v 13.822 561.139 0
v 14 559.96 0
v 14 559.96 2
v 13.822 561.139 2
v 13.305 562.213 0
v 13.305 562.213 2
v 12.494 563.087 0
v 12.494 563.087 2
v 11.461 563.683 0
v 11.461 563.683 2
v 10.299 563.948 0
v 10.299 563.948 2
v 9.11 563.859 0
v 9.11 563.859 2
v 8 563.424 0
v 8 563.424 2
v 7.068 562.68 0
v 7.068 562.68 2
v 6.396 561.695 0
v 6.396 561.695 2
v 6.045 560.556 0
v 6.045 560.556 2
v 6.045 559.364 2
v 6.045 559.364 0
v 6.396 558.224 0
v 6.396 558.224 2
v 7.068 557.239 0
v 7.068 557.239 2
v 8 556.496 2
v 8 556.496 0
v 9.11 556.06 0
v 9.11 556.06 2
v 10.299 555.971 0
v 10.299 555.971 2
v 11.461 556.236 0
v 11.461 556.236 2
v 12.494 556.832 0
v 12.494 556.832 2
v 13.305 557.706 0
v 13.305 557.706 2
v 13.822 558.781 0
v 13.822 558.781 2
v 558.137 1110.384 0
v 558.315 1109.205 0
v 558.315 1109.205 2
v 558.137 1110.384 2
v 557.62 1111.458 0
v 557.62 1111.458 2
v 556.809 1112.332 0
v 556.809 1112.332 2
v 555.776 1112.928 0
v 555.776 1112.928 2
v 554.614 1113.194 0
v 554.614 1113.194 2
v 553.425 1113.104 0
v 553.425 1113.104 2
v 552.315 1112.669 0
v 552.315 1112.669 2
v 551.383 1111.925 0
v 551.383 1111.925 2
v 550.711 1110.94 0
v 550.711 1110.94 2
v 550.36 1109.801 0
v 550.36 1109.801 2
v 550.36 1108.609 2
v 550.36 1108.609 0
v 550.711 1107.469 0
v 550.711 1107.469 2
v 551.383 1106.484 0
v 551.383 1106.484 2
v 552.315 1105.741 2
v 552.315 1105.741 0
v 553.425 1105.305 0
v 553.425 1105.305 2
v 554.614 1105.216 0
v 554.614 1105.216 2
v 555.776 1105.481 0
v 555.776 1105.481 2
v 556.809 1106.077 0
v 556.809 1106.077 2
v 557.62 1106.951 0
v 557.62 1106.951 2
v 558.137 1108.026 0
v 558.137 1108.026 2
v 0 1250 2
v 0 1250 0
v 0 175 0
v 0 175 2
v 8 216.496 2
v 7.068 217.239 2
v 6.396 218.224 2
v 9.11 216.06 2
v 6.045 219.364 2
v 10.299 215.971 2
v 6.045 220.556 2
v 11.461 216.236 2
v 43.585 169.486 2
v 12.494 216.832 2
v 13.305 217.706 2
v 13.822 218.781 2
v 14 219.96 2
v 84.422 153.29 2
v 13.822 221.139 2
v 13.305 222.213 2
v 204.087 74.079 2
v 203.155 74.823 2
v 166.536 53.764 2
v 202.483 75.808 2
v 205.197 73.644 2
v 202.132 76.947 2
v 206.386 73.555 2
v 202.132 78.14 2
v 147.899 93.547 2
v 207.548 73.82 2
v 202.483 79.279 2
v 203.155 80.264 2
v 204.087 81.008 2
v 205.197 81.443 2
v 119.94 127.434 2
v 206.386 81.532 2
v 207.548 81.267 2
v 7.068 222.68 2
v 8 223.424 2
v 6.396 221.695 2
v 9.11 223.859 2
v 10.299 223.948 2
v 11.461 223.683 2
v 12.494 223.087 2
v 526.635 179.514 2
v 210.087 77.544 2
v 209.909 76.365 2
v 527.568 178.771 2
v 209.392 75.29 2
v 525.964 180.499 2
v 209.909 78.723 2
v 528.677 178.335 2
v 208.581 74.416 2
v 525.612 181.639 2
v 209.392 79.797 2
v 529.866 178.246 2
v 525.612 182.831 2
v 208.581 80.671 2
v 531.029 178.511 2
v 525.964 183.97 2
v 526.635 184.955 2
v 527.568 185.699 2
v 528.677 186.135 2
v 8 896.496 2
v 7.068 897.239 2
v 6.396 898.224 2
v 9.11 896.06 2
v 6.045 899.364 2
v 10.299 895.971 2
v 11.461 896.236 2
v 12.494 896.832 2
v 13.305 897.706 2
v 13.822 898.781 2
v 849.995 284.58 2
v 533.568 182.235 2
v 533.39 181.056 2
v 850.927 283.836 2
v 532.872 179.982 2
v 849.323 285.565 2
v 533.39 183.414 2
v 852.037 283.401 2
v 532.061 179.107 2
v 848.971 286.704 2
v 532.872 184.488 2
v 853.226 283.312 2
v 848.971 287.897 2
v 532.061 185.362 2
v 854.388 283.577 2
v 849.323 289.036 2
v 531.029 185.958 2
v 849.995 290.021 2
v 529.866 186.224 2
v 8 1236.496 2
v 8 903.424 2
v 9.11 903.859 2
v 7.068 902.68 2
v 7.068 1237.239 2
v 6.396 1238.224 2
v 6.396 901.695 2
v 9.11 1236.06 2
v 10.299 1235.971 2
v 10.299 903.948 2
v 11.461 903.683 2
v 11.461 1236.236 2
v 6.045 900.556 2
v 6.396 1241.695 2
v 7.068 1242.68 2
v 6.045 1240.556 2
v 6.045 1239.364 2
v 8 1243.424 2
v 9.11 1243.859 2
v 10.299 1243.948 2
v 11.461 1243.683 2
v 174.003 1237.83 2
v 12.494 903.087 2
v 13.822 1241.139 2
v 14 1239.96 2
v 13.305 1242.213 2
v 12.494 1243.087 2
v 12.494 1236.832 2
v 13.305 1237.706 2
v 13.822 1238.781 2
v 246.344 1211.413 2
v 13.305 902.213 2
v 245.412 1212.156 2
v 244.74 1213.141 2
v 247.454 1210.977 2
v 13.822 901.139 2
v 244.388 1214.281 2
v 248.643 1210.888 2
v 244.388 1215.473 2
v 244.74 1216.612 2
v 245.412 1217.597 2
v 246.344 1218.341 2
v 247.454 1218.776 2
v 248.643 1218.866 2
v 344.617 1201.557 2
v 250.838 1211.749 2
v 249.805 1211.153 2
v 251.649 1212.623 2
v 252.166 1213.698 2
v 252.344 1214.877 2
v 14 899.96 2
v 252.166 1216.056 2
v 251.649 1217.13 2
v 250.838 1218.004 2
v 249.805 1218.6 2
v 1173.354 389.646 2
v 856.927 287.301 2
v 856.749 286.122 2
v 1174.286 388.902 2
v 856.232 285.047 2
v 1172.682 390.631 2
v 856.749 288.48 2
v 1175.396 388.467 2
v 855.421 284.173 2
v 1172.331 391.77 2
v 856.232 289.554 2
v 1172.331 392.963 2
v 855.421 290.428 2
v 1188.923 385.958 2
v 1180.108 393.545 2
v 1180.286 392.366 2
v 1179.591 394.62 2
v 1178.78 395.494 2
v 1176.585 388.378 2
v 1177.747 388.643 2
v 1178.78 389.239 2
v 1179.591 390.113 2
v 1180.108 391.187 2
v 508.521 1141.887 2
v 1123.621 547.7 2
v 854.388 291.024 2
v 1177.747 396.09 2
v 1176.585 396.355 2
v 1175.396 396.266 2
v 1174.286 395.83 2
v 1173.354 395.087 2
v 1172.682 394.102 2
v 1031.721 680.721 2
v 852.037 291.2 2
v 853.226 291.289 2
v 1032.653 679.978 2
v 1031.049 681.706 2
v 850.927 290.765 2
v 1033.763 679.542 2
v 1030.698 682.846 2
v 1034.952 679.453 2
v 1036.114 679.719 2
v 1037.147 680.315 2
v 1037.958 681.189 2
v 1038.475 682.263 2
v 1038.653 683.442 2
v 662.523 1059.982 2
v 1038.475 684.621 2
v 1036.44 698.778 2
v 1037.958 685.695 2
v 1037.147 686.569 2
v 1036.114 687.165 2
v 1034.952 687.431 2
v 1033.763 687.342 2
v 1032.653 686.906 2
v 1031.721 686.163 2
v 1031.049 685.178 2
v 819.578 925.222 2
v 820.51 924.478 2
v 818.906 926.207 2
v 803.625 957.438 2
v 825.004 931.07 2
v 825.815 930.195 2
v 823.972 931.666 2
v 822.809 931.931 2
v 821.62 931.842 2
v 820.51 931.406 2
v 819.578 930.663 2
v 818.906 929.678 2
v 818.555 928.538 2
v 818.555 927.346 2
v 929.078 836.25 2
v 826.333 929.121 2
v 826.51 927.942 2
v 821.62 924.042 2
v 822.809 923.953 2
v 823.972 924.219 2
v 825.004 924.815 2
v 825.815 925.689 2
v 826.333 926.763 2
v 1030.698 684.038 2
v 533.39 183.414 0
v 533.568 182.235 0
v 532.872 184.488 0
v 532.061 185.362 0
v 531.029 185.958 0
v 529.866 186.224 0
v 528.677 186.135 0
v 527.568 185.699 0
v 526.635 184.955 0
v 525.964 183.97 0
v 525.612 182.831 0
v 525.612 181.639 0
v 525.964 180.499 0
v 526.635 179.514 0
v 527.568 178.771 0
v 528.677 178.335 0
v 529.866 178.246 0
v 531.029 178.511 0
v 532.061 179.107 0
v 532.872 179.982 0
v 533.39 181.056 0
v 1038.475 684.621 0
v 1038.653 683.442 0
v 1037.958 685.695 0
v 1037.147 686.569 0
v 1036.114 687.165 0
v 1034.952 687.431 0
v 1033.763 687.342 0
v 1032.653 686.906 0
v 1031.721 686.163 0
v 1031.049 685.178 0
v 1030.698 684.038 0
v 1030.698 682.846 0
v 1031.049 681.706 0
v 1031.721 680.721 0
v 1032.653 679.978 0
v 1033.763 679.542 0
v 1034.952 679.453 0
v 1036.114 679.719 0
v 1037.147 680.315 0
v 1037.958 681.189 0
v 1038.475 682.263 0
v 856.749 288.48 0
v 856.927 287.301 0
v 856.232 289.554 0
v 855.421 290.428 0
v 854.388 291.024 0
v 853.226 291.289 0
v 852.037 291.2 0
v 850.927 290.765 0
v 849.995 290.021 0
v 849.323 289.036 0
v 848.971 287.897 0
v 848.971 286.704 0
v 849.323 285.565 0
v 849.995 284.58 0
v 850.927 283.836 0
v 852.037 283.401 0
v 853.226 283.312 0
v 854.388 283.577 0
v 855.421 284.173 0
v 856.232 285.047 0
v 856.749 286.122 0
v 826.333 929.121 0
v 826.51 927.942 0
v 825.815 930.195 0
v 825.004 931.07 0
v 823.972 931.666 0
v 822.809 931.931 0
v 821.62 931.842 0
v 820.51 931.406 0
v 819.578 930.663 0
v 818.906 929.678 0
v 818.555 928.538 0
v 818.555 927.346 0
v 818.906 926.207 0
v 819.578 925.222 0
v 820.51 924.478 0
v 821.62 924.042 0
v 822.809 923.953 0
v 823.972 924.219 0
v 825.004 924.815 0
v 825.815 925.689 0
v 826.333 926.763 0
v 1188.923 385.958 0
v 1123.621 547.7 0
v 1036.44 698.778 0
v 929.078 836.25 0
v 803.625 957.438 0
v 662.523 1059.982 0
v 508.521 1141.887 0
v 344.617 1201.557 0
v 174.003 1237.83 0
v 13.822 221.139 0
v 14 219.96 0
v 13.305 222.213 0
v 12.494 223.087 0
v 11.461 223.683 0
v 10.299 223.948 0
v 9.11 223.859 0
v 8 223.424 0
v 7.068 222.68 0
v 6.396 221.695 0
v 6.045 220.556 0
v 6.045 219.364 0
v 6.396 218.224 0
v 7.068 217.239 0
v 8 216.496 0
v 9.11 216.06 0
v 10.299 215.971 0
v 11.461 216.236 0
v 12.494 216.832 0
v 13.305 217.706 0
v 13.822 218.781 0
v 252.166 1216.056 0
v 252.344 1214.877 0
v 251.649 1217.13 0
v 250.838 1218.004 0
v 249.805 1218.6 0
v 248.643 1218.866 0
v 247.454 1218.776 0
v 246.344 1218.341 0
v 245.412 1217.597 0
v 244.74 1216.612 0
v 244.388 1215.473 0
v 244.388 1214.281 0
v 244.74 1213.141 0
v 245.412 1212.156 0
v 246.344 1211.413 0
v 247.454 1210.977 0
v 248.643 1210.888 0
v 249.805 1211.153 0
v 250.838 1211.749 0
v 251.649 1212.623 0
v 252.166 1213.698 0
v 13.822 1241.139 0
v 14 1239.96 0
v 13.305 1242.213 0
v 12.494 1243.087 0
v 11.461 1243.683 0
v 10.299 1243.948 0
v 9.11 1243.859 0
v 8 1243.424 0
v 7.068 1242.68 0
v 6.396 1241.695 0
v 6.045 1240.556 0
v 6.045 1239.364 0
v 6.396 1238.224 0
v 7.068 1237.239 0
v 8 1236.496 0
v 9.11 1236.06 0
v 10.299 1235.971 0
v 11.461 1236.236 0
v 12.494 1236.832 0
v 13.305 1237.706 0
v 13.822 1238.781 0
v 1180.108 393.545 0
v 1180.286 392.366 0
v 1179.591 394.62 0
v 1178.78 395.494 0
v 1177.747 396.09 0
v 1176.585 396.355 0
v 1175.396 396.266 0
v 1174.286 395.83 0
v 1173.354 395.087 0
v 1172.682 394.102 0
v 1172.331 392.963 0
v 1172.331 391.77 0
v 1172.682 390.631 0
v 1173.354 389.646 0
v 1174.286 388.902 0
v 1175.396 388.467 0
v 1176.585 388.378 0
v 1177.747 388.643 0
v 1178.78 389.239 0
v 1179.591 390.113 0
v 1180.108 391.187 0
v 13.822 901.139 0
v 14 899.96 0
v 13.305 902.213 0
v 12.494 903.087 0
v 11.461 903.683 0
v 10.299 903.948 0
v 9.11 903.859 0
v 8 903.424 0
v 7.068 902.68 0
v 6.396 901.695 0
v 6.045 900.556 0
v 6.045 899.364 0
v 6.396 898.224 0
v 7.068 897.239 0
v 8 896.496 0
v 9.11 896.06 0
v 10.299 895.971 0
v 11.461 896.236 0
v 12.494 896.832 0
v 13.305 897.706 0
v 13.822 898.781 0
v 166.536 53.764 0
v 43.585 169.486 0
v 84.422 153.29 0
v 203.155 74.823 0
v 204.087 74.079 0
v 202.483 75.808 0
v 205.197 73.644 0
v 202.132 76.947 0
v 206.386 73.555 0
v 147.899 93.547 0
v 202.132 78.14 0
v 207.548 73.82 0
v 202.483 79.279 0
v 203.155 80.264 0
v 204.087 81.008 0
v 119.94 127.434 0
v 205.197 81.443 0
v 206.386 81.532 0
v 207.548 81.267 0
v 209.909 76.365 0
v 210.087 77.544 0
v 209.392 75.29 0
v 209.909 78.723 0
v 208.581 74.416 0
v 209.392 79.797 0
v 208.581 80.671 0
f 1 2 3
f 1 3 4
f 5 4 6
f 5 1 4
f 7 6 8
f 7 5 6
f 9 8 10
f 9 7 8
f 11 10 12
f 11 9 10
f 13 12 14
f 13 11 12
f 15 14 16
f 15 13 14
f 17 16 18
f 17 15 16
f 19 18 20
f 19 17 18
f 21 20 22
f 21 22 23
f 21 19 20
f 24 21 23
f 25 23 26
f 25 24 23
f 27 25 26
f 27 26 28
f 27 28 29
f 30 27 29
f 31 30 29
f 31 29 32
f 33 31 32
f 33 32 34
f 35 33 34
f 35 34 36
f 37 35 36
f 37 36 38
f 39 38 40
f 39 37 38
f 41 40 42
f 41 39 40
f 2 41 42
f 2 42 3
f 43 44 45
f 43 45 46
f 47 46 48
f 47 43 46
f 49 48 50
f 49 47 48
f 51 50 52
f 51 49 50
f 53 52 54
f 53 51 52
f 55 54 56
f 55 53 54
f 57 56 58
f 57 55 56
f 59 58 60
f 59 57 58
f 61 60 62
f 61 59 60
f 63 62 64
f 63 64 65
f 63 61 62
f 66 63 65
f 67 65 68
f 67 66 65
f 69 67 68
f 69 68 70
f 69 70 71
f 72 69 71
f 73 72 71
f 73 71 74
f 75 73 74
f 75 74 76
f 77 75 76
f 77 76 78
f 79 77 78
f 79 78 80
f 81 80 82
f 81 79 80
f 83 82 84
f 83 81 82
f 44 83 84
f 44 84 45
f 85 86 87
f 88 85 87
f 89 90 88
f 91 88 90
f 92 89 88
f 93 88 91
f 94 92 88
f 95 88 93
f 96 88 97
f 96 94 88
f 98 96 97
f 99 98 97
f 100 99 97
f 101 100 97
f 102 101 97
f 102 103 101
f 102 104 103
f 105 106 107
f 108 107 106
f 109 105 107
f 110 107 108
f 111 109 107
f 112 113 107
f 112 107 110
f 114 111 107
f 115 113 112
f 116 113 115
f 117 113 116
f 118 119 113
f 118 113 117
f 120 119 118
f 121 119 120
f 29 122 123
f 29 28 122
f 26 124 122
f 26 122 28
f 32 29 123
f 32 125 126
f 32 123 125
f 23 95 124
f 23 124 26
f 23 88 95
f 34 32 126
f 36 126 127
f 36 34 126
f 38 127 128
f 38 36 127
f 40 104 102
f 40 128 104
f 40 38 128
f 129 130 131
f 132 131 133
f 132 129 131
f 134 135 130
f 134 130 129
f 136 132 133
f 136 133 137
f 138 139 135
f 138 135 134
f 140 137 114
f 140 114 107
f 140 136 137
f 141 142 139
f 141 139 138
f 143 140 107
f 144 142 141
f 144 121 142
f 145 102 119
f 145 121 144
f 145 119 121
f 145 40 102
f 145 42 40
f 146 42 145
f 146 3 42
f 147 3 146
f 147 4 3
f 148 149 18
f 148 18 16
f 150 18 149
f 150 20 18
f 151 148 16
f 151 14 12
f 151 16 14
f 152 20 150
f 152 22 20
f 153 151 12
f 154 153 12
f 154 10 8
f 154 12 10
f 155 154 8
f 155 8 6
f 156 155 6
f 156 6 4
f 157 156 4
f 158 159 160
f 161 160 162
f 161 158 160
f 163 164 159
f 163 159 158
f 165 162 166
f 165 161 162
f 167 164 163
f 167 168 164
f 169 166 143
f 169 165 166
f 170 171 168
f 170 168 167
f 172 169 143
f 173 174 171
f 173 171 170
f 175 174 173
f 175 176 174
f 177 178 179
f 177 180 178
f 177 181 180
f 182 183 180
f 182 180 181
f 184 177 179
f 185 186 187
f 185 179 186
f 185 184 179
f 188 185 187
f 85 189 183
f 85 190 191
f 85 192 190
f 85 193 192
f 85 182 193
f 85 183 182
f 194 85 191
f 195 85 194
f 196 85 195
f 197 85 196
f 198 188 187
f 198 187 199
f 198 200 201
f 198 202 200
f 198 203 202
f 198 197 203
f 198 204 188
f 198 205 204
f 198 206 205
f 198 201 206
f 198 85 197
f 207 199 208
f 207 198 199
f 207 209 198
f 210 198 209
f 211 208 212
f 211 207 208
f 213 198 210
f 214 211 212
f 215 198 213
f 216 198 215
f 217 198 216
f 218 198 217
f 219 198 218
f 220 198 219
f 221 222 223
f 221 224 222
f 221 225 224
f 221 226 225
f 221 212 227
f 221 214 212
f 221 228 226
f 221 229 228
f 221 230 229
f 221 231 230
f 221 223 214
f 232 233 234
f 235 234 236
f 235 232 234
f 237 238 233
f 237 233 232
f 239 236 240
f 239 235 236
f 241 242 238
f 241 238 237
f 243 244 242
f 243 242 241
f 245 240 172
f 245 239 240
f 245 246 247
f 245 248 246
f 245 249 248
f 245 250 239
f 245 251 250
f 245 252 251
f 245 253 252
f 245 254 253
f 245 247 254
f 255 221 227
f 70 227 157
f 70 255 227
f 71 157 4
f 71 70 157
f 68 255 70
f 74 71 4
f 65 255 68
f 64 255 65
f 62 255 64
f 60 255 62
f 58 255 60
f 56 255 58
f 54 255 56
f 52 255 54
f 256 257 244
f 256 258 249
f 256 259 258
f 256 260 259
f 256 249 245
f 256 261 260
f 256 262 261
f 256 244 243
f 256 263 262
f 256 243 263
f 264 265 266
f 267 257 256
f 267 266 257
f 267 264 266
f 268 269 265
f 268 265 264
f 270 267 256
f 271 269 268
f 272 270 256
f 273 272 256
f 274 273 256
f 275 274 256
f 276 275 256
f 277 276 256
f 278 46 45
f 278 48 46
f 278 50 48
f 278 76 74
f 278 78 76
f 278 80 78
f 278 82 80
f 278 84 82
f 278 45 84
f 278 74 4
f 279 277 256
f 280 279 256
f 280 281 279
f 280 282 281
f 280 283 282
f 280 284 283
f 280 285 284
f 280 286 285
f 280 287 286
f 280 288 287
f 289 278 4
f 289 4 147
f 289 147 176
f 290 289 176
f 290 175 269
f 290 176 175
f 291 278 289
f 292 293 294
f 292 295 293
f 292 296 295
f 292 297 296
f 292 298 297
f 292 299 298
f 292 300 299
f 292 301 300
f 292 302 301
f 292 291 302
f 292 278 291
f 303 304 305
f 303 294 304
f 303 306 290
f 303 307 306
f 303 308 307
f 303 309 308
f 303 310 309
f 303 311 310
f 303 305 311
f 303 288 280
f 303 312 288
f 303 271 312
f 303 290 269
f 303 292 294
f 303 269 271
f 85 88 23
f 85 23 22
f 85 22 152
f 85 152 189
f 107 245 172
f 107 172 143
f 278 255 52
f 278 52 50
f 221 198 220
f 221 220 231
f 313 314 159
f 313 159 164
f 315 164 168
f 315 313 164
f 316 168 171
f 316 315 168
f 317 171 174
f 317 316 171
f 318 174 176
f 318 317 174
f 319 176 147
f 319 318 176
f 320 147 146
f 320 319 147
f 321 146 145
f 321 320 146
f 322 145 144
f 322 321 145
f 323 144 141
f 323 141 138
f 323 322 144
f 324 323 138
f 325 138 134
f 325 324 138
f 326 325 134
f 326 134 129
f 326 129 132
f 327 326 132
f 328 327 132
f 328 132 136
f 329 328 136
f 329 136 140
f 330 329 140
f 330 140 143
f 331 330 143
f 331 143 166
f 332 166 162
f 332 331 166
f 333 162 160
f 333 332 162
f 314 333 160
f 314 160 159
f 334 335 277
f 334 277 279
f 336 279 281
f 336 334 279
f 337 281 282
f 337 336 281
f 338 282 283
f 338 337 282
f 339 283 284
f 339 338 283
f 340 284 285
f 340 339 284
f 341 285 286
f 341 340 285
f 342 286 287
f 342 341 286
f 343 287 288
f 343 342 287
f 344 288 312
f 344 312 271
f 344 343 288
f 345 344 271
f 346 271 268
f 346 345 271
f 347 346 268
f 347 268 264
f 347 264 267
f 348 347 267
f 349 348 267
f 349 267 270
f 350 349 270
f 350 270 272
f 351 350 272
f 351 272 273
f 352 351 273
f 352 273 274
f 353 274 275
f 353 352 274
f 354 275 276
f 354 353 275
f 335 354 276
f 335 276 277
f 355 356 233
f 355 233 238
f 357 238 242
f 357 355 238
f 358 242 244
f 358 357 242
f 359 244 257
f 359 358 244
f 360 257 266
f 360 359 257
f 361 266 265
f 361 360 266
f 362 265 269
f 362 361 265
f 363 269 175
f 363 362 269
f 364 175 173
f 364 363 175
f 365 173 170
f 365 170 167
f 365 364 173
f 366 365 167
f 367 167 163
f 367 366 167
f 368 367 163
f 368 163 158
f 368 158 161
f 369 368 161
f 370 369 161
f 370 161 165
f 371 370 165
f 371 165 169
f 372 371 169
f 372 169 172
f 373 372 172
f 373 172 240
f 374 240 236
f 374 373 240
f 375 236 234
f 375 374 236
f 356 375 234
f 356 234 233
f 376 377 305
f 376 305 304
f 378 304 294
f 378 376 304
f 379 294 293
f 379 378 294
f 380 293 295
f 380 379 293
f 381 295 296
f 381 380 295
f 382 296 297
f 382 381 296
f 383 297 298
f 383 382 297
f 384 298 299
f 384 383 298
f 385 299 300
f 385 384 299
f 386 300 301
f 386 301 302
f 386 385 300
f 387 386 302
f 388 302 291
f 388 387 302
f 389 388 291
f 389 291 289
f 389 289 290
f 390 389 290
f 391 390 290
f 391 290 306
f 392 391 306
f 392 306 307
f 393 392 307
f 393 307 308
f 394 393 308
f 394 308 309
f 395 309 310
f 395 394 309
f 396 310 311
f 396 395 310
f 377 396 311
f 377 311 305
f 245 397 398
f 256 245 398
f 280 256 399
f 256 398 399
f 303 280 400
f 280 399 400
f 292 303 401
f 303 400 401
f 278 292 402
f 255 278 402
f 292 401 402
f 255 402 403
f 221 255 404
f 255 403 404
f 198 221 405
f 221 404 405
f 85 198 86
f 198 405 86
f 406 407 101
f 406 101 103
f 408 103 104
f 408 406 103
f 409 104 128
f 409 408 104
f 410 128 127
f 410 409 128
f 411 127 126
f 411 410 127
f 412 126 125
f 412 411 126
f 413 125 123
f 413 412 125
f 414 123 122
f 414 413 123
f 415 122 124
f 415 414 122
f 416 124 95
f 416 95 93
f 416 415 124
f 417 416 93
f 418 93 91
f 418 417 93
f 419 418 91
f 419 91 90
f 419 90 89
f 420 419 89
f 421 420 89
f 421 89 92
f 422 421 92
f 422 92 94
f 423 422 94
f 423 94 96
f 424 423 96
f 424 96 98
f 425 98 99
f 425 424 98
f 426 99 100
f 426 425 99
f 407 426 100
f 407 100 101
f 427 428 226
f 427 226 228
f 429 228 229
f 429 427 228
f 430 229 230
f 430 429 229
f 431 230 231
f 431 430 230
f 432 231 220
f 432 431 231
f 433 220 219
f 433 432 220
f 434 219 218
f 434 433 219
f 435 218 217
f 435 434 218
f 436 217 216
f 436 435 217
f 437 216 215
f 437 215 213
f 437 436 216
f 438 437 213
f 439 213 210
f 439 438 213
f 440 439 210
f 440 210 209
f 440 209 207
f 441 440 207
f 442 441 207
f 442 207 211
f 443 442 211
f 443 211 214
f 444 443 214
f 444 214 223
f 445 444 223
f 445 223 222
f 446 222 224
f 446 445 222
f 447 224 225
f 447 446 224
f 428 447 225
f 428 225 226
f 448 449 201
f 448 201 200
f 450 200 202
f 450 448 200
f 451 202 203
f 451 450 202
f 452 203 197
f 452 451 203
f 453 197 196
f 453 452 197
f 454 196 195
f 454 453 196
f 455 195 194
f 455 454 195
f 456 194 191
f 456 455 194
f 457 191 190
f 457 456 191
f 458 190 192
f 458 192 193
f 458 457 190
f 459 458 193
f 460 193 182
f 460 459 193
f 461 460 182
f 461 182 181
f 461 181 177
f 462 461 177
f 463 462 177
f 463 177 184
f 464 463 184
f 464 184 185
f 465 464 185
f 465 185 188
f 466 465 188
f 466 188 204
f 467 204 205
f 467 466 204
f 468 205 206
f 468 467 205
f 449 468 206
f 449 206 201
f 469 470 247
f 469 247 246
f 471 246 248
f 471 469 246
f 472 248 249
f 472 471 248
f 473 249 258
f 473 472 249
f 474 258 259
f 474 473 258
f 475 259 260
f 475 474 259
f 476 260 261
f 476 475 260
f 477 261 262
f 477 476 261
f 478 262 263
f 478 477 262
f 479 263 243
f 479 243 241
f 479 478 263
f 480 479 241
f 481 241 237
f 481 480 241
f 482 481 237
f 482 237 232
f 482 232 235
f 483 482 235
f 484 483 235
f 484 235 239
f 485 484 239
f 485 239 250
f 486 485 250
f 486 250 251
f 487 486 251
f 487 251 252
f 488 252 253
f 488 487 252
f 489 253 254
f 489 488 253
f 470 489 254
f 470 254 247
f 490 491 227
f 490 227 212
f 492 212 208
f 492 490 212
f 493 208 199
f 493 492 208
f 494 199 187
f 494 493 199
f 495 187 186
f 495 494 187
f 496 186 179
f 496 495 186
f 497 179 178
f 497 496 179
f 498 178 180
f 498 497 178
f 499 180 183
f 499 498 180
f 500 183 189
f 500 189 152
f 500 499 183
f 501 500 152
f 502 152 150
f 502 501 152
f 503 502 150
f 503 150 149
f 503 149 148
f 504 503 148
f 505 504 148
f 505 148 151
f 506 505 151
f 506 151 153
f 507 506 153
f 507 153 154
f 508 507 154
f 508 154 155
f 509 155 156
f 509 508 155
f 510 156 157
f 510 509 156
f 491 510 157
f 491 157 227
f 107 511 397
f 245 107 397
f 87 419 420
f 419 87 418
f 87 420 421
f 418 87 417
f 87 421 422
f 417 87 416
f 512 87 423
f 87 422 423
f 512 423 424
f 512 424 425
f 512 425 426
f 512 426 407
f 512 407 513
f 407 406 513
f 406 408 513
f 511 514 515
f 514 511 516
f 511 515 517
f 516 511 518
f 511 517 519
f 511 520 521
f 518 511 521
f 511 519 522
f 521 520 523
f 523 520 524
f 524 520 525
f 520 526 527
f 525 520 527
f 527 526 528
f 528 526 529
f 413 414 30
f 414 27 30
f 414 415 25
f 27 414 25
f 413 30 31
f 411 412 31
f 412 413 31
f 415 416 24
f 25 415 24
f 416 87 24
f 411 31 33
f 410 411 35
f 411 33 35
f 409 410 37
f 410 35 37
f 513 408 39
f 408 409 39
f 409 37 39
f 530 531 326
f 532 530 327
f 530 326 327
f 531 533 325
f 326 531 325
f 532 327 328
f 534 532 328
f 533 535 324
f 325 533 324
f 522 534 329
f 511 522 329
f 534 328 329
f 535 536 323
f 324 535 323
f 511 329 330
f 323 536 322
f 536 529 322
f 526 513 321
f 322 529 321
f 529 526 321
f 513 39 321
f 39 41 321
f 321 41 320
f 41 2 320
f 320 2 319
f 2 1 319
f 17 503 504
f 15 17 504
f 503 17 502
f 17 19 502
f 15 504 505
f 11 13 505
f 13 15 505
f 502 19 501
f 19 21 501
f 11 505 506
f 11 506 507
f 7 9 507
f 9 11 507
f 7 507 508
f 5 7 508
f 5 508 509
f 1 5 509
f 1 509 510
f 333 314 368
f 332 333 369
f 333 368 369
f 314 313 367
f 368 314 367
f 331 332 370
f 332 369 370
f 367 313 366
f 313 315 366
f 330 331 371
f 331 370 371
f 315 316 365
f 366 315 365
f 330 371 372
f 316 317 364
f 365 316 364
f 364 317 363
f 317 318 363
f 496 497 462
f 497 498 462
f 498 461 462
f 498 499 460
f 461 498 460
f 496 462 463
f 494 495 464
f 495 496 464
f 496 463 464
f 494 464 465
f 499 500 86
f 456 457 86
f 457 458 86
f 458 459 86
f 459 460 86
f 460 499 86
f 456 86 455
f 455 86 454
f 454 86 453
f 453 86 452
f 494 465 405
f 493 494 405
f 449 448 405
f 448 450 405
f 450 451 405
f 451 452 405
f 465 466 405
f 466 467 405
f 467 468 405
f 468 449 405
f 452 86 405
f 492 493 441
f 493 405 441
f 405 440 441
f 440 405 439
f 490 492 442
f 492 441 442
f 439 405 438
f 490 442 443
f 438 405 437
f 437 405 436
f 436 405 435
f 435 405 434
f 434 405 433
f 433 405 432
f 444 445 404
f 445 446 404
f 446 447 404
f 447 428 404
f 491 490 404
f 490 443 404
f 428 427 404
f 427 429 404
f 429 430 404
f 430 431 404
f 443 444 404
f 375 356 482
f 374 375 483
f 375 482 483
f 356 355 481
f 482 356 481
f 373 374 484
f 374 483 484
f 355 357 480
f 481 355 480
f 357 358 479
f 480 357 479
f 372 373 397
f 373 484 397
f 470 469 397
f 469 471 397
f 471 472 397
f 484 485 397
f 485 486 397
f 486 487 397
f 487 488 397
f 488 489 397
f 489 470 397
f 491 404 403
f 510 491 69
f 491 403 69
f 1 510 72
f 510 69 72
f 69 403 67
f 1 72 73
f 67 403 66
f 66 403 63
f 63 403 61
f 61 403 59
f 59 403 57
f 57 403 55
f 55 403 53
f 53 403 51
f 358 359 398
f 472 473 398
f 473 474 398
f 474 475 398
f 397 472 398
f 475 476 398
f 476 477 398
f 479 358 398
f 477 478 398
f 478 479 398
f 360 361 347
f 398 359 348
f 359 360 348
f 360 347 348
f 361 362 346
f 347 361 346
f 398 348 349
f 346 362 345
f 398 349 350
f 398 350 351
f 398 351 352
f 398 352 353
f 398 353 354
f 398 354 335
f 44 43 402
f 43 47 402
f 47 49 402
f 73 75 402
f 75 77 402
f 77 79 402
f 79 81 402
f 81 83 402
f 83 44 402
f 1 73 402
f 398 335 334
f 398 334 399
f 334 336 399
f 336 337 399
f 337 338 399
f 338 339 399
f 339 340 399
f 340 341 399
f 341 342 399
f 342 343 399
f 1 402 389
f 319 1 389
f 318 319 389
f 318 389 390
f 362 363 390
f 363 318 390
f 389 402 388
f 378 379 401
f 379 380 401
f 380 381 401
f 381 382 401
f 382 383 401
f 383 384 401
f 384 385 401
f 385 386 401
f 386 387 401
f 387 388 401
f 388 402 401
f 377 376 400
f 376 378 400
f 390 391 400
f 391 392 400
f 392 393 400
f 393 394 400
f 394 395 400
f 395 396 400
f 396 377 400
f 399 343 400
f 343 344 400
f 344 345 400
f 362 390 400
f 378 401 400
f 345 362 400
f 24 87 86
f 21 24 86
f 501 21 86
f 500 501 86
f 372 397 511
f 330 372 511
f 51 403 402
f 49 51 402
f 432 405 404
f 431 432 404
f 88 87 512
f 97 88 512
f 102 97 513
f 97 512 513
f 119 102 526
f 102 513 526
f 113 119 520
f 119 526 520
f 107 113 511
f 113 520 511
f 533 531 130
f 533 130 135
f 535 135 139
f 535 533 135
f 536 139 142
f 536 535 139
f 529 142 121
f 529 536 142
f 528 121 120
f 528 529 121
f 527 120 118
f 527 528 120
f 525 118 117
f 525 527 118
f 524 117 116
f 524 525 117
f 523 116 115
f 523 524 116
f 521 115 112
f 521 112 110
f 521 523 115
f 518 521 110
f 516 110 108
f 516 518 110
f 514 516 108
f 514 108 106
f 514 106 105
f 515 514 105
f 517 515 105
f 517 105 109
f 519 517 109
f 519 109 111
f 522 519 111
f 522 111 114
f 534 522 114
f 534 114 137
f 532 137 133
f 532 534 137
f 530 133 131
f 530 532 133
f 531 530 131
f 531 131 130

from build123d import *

# Parameters (mm, degrees)
SKETCH1_R             = 4
BOSS_EXTRUDE1_DEPTH   = 2
CIRPATTERN1_OUTLINE_R = 4
CIRPATTERN1_DEPTH     = 2


# Read off the part's stored shape, not the designer's step: CirPattern1
with BuildPart() as part:
    # Sketch1 → Boss-Extrude1 (new body)
    with BuildSketch(Plane.XY):
        with BuildLine():
            Line((0, 1250), (0, 175))
            ThreePointArc((0, 175), (102.995768235, 141.480994221), (166.536499319, 53.764248293))
            Line((166.536499319, 53.764248293), (1188.922508468, 385.957599819))
            ThreePointArc((1188.922508468, 385.957599819), (734.864953657, 1011.17431726), (0, 1250))
        make_face()
        with Locations((206.086847975, 77.543569361)):
            Circle(SKETCH1_R, mode=Mode.SUBTRACT)
        with Locations((529.567521621, 182.234800025)):
            Circle(SKETCH1_R, mode=Mode.SUBTRACT)
        with Locations((852.926737161, 287.300578112)):
            Circle(SKETCH1_R, mode=Mode.SUBTRACT)
        with Locations((10, 219.959676764)):
            Circle(SKETCH1_R, mode=Mode.SUBTRACT)
        with Locations((10, 559.959676764)):
            Circle(SKETCH1_R, mode=Mode.SUBTRACT)
        with Locations((10, 899.959676764)):
            Circle(SKETCH1_R, mode=Mode.SUBTRACT)
        with Locations((10, 1239.959676764)):
            Circle(SKETCH1_R, mode=Mode.SUBTRACT)
        with Locations((1176.285952701, 392.3663562)):
            Circle(SKETCH1_R, mode=Mode.SUBTRACT)
    extrude(amount=BOSS_EXTRUDE1_DEPTH)

    # CirPattern1 outline → CirPattern1 (cut)
    with BuildSketch(Plane.XY):
        with Locations((248.343744291, 1214.876695254)):
            Circle(CIRPATTERN1_OUTLINE_R)
        with Locations((554.314862591, 1109.204684948)):
            Circle(CIRPATTERN1_OUTLINE_R)
        with Locations((822.510339054, 927.94220841)):
            Circle(CIRPATTERN1_OUTLINE_R)
        with Locations((1034.653095173, 683.442003866)):
            Circle(CIRPATTERN1_OUTLINE_R)
    extrude(amount=CIRPATTERN1_DEPTH, mode=Mode.SUBTRACT)


solid = part.part
